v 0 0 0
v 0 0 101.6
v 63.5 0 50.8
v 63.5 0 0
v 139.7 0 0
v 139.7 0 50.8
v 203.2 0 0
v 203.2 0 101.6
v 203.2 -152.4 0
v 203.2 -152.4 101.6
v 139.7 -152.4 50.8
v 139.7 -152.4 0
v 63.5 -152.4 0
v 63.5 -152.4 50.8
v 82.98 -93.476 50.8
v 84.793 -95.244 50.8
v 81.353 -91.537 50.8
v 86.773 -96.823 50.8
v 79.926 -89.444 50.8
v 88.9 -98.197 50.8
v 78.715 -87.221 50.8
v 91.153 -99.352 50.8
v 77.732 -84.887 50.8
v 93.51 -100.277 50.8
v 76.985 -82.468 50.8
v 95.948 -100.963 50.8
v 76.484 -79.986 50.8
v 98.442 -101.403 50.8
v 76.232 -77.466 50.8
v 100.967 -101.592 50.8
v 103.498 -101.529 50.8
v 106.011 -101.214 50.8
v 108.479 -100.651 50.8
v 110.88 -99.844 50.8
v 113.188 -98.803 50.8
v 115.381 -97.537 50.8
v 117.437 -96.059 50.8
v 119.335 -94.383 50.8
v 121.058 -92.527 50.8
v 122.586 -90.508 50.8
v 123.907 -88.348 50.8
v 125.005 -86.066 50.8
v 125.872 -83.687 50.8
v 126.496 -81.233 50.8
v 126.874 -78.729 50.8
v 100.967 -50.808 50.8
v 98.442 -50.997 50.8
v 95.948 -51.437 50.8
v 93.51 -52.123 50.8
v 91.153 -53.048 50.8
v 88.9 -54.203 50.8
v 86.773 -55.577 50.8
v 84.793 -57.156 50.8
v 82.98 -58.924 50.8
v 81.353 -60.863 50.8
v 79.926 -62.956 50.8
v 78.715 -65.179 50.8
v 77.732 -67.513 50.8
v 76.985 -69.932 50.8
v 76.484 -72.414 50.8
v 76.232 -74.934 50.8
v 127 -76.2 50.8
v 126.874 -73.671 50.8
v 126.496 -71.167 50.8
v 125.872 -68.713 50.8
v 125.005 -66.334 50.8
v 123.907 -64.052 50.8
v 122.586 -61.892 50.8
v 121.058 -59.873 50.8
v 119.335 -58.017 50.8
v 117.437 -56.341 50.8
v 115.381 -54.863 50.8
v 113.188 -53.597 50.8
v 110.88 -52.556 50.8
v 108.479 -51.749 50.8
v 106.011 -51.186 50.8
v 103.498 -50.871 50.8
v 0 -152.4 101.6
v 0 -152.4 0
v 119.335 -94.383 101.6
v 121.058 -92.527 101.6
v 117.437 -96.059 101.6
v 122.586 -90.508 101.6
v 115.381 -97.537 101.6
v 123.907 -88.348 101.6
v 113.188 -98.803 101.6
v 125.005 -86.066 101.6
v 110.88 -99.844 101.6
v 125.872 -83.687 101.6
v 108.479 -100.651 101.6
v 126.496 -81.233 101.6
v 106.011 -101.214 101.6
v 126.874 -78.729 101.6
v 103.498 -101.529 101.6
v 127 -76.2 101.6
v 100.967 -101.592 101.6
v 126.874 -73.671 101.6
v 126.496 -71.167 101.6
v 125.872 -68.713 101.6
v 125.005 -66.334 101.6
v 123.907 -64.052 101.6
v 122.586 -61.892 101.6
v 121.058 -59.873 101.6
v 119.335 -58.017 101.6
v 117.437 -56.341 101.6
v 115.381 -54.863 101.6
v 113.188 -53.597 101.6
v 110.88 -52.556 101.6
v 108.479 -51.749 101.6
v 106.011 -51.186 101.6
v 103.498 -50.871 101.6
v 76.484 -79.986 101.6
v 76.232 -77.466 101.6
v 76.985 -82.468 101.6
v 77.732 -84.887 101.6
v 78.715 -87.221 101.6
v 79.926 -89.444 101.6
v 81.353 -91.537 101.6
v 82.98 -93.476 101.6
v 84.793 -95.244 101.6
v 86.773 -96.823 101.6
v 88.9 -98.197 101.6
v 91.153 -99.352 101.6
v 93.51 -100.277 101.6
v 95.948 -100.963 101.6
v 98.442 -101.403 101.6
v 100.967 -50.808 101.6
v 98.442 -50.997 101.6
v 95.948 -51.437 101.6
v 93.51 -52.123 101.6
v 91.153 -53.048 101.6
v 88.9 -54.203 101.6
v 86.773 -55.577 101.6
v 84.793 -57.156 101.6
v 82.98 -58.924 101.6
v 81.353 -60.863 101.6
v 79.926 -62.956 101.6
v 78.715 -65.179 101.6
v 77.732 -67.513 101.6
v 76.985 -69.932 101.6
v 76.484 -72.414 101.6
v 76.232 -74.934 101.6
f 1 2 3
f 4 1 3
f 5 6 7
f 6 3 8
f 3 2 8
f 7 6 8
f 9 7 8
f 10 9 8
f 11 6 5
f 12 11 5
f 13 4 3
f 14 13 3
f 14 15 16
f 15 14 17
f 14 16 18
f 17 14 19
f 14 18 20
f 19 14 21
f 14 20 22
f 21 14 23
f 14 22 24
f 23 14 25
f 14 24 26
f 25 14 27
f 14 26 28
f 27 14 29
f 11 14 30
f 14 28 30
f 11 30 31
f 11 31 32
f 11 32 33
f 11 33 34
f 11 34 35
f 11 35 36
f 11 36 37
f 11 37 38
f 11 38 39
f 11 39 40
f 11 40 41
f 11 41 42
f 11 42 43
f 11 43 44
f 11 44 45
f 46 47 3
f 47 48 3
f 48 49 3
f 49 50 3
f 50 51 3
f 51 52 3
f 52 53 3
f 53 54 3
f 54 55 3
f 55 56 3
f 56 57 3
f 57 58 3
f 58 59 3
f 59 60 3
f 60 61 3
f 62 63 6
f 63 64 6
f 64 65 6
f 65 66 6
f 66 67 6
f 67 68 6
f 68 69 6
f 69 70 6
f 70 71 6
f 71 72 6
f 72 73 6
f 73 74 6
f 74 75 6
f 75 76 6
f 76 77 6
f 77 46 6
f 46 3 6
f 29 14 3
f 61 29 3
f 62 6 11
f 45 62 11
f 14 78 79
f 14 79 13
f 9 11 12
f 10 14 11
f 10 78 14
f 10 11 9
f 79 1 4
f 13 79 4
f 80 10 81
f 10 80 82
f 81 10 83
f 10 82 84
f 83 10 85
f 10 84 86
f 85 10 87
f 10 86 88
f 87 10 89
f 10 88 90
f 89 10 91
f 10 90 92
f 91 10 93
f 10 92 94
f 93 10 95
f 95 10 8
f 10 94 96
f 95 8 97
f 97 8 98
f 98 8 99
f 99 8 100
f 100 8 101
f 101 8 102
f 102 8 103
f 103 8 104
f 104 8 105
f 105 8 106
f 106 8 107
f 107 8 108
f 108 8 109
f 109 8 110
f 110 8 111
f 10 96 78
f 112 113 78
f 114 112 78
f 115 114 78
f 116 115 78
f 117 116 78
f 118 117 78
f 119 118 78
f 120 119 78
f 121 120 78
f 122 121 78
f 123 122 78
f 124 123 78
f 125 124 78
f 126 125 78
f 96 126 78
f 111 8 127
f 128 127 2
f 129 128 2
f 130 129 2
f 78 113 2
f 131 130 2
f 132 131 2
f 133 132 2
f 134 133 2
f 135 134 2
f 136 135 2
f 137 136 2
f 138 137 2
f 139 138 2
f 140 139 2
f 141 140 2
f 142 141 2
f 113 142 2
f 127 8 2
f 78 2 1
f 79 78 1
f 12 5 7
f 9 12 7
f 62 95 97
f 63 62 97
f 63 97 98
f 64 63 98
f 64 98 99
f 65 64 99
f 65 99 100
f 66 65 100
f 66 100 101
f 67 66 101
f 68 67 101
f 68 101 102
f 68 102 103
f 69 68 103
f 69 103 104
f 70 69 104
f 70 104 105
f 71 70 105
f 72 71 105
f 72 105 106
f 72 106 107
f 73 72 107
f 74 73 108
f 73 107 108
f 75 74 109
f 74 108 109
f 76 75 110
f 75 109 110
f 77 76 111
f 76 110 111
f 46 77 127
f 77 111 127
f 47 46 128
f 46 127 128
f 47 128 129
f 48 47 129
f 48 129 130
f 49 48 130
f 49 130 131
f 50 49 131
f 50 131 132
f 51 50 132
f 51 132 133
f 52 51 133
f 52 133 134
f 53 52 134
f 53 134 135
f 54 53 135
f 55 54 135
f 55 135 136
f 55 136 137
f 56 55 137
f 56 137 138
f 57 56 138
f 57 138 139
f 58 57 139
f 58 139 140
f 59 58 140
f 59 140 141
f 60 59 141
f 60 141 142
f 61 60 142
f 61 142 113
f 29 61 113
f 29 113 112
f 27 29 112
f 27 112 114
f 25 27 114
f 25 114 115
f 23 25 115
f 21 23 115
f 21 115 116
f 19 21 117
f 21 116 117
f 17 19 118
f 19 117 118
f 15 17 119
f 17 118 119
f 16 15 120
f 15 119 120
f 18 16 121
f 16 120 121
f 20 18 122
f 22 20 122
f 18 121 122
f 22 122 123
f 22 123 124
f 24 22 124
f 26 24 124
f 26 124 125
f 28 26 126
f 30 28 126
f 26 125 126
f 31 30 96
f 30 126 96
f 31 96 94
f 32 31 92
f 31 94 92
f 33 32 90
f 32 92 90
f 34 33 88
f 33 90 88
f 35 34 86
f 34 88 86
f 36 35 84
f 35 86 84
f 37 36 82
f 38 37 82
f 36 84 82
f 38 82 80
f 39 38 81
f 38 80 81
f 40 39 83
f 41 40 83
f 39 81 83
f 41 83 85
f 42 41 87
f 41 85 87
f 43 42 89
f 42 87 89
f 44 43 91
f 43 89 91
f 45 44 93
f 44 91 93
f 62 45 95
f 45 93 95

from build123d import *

# Parameters (mm, degrees)
F1_DEPTH = 152.4
F2_R     = 25.4
F3_DEPTH = 101.601


with BuildPart() as f1:
    # F0 (on Front) → F1 (new body)
    with BuildSketch(Plane.XZ):
        Polygon((0, 101.6), (0, 0), (63.5, 0), (63.5, 50.8), (139.7, 50.8), (139.7, 0), (203.2, 0), (203.2, 101.6), align=None)
    extrude(amount=F1_DEPTH)

    # F2 (on face) → F3 (cut, through all)
    with BuildSketch(Plane.XY.offset(101.6)):
        with Locations((101.6, -76.2)):
            Circle(F2_R)
    extrude(amount=-F3_DEPTH, mode=Mode.SUBTRACT)


solid = f1.part
